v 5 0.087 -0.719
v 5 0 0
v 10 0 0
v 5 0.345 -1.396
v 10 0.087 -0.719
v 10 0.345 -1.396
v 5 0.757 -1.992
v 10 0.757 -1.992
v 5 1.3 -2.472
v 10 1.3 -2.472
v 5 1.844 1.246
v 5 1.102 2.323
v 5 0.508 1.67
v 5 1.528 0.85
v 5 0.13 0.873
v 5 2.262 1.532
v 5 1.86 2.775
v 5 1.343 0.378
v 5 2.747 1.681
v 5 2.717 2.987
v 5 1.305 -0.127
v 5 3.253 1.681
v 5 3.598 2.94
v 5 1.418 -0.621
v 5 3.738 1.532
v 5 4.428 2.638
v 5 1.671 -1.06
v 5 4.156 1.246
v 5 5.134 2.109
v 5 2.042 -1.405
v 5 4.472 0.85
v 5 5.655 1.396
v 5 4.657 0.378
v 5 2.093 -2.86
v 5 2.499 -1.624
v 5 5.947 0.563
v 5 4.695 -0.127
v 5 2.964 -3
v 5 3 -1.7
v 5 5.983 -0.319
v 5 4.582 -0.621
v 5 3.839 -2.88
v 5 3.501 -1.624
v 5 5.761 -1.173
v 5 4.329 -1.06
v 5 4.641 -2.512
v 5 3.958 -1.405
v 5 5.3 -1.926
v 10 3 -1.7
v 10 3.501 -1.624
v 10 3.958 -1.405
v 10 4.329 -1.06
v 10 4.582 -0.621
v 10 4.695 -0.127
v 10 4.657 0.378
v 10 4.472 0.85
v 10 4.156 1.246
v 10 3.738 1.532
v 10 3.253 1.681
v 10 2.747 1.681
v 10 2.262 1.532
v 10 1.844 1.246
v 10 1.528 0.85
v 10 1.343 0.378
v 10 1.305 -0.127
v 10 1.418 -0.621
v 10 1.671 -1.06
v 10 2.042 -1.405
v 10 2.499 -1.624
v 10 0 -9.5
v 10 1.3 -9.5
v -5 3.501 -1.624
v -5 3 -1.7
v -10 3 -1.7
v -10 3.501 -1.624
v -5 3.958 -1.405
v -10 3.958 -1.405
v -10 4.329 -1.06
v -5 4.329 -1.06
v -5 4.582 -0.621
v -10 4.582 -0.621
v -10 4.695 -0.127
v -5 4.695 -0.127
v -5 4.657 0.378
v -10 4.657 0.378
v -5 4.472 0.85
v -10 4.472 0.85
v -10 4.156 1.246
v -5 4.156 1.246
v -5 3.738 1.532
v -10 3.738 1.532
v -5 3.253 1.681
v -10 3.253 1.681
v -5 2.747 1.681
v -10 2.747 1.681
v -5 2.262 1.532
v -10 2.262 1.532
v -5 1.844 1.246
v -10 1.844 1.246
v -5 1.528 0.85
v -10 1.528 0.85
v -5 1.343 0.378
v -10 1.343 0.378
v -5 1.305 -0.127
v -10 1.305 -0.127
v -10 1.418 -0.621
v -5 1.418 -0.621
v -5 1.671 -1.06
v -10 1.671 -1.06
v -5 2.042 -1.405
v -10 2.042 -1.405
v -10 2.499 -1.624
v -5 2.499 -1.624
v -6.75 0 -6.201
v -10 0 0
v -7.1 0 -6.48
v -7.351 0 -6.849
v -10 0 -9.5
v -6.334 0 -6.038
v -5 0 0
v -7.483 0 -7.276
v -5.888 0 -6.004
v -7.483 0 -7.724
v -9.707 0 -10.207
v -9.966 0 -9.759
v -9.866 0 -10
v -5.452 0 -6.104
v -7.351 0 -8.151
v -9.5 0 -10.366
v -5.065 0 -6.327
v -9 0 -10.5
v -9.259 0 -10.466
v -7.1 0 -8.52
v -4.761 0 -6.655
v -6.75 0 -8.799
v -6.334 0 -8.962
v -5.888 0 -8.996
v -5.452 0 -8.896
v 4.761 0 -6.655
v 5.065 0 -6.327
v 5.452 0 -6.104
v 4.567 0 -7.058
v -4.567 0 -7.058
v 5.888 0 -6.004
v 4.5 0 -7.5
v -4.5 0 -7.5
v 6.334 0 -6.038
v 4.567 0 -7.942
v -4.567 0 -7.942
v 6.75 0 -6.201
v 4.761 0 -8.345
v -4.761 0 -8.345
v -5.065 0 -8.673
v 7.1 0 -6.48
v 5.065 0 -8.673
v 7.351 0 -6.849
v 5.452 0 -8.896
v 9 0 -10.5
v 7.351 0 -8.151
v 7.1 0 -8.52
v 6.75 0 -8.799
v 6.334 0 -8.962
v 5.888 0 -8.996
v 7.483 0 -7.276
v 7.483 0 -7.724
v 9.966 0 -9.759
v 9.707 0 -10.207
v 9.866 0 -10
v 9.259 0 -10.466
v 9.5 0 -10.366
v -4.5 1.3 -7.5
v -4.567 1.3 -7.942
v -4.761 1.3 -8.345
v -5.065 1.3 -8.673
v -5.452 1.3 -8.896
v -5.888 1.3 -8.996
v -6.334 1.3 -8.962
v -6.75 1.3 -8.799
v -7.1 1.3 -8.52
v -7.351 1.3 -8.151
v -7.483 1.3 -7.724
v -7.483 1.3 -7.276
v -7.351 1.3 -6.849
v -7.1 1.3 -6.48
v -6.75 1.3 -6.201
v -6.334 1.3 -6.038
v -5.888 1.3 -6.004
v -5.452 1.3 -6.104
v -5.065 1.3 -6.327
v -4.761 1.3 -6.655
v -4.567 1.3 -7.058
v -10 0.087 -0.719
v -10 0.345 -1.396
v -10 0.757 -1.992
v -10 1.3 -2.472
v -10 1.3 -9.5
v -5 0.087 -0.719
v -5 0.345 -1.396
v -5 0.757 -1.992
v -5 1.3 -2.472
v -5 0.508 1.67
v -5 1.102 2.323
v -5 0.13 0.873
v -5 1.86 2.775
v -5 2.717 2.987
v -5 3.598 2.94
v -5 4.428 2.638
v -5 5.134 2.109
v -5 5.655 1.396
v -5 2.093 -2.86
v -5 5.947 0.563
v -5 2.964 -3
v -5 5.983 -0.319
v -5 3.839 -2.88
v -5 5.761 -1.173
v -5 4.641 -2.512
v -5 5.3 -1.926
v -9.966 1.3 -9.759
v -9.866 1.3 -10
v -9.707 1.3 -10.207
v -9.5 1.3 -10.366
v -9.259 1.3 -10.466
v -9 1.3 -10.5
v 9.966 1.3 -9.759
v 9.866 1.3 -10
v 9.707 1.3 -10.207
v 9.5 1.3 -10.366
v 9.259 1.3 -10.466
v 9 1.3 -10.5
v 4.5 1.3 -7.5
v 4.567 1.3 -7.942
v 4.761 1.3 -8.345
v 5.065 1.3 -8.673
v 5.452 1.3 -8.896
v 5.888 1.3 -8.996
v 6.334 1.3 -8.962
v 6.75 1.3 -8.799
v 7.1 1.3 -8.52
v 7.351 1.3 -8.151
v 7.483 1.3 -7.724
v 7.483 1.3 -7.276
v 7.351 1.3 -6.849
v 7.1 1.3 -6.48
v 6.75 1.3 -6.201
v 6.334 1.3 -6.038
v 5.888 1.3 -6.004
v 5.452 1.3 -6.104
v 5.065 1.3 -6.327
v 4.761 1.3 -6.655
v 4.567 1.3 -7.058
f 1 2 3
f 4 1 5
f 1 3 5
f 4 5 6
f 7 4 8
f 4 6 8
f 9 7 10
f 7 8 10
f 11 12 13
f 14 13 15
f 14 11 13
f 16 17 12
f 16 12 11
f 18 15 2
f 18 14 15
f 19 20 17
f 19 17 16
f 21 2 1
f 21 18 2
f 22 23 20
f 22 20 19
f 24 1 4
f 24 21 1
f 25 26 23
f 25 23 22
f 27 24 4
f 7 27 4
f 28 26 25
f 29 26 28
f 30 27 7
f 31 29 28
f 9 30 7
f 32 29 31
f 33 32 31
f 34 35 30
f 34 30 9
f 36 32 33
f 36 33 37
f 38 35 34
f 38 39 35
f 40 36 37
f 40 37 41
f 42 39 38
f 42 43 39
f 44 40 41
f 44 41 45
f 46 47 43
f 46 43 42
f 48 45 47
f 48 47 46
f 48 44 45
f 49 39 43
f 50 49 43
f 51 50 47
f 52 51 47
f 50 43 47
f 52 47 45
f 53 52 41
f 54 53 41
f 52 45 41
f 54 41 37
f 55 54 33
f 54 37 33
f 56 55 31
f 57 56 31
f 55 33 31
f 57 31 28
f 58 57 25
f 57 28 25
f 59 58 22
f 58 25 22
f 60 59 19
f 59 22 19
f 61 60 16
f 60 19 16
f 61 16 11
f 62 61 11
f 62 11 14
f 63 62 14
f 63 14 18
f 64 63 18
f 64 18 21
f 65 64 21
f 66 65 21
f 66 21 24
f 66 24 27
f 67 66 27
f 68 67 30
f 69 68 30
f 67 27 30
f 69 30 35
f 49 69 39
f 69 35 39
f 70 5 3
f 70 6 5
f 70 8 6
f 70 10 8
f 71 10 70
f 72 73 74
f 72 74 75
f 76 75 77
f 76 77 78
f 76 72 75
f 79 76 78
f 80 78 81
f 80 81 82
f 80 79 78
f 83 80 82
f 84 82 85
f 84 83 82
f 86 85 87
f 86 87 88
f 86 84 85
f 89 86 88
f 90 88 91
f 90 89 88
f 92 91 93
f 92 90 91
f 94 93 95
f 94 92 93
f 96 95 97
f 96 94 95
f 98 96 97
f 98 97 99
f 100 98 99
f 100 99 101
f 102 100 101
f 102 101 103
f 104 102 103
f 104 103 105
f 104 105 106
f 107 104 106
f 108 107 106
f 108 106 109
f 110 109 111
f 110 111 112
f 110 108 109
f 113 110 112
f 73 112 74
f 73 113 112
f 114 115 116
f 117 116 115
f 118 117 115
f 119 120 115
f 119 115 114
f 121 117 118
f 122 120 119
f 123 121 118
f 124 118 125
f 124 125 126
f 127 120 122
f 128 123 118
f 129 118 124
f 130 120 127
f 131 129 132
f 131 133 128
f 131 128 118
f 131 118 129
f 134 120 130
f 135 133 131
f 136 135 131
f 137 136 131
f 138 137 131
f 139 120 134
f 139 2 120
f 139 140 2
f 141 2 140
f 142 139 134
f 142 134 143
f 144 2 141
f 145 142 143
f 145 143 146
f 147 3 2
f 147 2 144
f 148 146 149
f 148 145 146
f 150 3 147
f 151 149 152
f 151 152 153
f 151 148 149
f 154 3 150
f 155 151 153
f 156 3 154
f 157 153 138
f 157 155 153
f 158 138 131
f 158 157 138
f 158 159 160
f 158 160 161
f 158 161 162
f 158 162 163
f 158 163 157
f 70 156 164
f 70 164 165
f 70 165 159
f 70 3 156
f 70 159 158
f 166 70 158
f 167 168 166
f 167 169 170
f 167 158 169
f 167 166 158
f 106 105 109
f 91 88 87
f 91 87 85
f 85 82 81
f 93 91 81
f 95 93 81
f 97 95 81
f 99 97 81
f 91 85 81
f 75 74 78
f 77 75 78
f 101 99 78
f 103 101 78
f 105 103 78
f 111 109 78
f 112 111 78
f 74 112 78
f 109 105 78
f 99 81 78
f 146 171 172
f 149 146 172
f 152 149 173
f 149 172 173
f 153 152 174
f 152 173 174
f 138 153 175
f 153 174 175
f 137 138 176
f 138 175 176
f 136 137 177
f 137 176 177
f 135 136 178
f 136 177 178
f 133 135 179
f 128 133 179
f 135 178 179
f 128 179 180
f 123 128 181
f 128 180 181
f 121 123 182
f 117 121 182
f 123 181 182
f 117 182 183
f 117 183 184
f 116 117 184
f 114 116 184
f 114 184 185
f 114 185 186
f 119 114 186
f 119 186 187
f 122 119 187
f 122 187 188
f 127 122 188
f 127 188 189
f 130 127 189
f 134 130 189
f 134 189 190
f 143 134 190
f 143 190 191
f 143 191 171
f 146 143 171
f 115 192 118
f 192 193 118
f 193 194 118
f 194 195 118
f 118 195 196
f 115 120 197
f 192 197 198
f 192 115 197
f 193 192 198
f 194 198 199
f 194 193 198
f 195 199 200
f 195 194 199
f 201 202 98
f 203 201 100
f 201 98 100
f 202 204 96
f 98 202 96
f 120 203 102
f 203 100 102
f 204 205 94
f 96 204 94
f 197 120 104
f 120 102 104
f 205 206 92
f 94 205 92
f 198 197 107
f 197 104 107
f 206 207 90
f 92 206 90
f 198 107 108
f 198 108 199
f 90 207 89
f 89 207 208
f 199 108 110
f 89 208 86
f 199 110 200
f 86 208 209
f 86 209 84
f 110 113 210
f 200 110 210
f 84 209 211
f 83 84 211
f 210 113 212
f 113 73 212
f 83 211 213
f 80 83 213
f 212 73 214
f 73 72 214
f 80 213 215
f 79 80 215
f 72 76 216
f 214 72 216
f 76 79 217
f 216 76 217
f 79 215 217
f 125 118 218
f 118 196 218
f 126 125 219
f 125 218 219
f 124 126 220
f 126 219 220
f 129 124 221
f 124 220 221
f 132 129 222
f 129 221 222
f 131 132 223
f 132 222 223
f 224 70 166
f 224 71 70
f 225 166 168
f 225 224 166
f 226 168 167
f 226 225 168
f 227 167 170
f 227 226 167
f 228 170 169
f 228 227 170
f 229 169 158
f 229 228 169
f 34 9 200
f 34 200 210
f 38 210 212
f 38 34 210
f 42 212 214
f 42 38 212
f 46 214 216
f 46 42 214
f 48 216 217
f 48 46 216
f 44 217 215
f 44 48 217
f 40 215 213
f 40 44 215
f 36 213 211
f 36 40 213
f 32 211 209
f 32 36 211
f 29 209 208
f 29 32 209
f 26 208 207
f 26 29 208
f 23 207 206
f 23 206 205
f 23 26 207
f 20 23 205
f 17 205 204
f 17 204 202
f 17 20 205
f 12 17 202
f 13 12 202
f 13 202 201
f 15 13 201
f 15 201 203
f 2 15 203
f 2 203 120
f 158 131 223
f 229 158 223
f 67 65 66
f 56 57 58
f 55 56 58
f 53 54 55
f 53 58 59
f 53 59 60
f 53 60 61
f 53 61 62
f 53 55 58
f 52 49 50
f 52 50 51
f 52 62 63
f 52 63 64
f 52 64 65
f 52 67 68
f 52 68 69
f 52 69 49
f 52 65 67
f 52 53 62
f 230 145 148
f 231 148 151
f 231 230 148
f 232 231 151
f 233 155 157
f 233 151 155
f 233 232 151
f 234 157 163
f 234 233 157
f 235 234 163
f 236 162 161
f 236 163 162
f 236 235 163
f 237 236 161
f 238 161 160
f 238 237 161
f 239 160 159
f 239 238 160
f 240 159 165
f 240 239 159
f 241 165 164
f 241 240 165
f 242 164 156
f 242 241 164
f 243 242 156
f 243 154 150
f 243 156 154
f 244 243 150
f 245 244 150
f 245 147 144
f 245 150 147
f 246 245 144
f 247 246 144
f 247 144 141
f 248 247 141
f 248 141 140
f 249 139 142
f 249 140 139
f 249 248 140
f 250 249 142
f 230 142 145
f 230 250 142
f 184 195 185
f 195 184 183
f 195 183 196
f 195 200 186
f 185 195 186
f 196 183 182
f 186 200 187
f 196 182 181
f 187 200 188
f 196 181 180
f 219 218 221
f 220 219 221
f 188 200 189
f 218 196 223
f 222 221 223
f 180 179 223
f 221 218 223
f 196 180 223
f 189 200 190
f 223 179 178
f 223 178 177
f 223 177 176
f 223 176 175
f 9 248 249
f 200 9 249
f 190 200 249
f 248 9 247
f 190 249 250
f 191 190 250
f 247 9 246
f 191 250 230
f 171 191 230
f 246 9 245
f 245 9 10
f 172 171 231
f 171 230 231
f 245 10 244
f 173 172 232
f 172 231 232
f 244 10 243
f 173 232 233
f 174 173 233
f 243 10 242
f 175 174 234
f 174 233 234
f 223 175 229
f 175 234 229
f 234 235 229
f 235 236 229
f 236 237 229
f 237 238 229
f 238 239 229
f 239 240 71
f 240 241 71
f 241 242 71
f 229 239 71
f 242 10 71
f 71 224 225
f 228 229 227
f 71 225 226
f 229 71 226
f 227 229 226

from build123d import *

# Parameters (mm, degrees)
SKETCH_1_W          = 10.5
SKETCH_1_H          = 1.3
EXTRUDE_1_DEPTH     = 10
SKETCH_2_R          = 3
CUT_EXTRUDE_1_DEPTH = 5
SKETCH_3_R          = 3
EXTRUDE_2_DEPTH     = 10
SKETCH_4_R          = 1.7
EXTRUDE_3_DEPTH     = 5
SKETCH_5_R          = 1.5
CUT_EXTRUDE_2_DEPTH = 5
FILLET_1_R          = 1


with BuildPart() as part:
    # 草图1 → 凸台-拉伸1 (new body, symmetric)
    with BuildSketch(Plane(origin=(0, 0, 0), x_dir=(0, 0, -1), z_dir=(1, 0, 0))):
        with Locations((5.25, 0.65)):
            Rectangle(SKETCH_1_W, SKETCH_1_H)
    extrude(amount=EXTRUDE_1_DEPTH, both=True)

    # 草图2 → 切除-拉伸1 (cut)
    with BuildSketch(Plane(origin=(10, 0, 0), x_dir=(0, 0, -1), z_dir=(1, 0, 0))):
        with Locations((0, 3)):
            Circle(SKETCH_2_R)
    cut_extrude_1 = extrude(amount=-CUT_EXTRUDE_1_DEPTH, mode=Mode.SUBTRACT)

    # 草图3 → 凸台-拉伸2 (add)
    with BuildSketch(Plane(origin=(5, 0, 0), x_dir=(0, 0, -1), z_dir=(1, 0, 0))):
        with Locations((0, 3)):
            Circle(SKETCH_3_R)
    extrude(amount=-EXTRUDE_2_DEPTH)

    # 草图4 → 凸台-拉伸3 (add)
    with BuildSketch(Plane(origin=(5, 0, 0), x_dir=(0, 0, -1), z_dir=(1, 0, 0))):
        with Locations((0, 3)):
            Circle(SKETCH_4_R)
    extrude_3 = extrude(amount=EXTRUDE_3_DEPTH)

    # 镜向1: 切除-拉伸1, 凸台-拉伸3 across plane
    add(cut_extrude_1.mirror(Plane(origin=(0, 0, 0), x_dir=(0, 0, 1), z_dir=(1, 0, 0))), mode=Mode.SUBTRACT)
    add(extrude_3.mirror(Plane(origin=(0, 0, 0), x_dir=(0, 0, 1), z_dir=(1, 0, 0))))

    # 草图5 → 切除-拉伸2 (cut)
    with BuildSketch(Plane(origin=(0, 1.3, 0), x_dir=(1, 0, 0), z_dir=(0, 1, 0))):
        with Locations((-6, 7.5)):
            Circle(SKETCH_5_R)
    cut_extrude_2 = extrude(amount=-CUT_EXTRUDE_2_DEPTH, mode=Mode.SUBTRACT)

    # 镜向2: 切除-拉伸2 across plane
    add(cut_extrude_2.mirror(Plane(origin=(0, 0, 0), x_dir=(0, 0, 1), z_dir=(1, 0, 0))), mode=Mode.SUBTRACT)

    # 圆角1
    fillet_1_edges = [part.edges().sort_by_distance(p)[0] for p in [
        (10, 0.65, -10.5),
        (-10, 0.65, -10.5),
    ]]
    fillet(fillet_1_edges, radius=FILLET_1_R)


solid = part.part
